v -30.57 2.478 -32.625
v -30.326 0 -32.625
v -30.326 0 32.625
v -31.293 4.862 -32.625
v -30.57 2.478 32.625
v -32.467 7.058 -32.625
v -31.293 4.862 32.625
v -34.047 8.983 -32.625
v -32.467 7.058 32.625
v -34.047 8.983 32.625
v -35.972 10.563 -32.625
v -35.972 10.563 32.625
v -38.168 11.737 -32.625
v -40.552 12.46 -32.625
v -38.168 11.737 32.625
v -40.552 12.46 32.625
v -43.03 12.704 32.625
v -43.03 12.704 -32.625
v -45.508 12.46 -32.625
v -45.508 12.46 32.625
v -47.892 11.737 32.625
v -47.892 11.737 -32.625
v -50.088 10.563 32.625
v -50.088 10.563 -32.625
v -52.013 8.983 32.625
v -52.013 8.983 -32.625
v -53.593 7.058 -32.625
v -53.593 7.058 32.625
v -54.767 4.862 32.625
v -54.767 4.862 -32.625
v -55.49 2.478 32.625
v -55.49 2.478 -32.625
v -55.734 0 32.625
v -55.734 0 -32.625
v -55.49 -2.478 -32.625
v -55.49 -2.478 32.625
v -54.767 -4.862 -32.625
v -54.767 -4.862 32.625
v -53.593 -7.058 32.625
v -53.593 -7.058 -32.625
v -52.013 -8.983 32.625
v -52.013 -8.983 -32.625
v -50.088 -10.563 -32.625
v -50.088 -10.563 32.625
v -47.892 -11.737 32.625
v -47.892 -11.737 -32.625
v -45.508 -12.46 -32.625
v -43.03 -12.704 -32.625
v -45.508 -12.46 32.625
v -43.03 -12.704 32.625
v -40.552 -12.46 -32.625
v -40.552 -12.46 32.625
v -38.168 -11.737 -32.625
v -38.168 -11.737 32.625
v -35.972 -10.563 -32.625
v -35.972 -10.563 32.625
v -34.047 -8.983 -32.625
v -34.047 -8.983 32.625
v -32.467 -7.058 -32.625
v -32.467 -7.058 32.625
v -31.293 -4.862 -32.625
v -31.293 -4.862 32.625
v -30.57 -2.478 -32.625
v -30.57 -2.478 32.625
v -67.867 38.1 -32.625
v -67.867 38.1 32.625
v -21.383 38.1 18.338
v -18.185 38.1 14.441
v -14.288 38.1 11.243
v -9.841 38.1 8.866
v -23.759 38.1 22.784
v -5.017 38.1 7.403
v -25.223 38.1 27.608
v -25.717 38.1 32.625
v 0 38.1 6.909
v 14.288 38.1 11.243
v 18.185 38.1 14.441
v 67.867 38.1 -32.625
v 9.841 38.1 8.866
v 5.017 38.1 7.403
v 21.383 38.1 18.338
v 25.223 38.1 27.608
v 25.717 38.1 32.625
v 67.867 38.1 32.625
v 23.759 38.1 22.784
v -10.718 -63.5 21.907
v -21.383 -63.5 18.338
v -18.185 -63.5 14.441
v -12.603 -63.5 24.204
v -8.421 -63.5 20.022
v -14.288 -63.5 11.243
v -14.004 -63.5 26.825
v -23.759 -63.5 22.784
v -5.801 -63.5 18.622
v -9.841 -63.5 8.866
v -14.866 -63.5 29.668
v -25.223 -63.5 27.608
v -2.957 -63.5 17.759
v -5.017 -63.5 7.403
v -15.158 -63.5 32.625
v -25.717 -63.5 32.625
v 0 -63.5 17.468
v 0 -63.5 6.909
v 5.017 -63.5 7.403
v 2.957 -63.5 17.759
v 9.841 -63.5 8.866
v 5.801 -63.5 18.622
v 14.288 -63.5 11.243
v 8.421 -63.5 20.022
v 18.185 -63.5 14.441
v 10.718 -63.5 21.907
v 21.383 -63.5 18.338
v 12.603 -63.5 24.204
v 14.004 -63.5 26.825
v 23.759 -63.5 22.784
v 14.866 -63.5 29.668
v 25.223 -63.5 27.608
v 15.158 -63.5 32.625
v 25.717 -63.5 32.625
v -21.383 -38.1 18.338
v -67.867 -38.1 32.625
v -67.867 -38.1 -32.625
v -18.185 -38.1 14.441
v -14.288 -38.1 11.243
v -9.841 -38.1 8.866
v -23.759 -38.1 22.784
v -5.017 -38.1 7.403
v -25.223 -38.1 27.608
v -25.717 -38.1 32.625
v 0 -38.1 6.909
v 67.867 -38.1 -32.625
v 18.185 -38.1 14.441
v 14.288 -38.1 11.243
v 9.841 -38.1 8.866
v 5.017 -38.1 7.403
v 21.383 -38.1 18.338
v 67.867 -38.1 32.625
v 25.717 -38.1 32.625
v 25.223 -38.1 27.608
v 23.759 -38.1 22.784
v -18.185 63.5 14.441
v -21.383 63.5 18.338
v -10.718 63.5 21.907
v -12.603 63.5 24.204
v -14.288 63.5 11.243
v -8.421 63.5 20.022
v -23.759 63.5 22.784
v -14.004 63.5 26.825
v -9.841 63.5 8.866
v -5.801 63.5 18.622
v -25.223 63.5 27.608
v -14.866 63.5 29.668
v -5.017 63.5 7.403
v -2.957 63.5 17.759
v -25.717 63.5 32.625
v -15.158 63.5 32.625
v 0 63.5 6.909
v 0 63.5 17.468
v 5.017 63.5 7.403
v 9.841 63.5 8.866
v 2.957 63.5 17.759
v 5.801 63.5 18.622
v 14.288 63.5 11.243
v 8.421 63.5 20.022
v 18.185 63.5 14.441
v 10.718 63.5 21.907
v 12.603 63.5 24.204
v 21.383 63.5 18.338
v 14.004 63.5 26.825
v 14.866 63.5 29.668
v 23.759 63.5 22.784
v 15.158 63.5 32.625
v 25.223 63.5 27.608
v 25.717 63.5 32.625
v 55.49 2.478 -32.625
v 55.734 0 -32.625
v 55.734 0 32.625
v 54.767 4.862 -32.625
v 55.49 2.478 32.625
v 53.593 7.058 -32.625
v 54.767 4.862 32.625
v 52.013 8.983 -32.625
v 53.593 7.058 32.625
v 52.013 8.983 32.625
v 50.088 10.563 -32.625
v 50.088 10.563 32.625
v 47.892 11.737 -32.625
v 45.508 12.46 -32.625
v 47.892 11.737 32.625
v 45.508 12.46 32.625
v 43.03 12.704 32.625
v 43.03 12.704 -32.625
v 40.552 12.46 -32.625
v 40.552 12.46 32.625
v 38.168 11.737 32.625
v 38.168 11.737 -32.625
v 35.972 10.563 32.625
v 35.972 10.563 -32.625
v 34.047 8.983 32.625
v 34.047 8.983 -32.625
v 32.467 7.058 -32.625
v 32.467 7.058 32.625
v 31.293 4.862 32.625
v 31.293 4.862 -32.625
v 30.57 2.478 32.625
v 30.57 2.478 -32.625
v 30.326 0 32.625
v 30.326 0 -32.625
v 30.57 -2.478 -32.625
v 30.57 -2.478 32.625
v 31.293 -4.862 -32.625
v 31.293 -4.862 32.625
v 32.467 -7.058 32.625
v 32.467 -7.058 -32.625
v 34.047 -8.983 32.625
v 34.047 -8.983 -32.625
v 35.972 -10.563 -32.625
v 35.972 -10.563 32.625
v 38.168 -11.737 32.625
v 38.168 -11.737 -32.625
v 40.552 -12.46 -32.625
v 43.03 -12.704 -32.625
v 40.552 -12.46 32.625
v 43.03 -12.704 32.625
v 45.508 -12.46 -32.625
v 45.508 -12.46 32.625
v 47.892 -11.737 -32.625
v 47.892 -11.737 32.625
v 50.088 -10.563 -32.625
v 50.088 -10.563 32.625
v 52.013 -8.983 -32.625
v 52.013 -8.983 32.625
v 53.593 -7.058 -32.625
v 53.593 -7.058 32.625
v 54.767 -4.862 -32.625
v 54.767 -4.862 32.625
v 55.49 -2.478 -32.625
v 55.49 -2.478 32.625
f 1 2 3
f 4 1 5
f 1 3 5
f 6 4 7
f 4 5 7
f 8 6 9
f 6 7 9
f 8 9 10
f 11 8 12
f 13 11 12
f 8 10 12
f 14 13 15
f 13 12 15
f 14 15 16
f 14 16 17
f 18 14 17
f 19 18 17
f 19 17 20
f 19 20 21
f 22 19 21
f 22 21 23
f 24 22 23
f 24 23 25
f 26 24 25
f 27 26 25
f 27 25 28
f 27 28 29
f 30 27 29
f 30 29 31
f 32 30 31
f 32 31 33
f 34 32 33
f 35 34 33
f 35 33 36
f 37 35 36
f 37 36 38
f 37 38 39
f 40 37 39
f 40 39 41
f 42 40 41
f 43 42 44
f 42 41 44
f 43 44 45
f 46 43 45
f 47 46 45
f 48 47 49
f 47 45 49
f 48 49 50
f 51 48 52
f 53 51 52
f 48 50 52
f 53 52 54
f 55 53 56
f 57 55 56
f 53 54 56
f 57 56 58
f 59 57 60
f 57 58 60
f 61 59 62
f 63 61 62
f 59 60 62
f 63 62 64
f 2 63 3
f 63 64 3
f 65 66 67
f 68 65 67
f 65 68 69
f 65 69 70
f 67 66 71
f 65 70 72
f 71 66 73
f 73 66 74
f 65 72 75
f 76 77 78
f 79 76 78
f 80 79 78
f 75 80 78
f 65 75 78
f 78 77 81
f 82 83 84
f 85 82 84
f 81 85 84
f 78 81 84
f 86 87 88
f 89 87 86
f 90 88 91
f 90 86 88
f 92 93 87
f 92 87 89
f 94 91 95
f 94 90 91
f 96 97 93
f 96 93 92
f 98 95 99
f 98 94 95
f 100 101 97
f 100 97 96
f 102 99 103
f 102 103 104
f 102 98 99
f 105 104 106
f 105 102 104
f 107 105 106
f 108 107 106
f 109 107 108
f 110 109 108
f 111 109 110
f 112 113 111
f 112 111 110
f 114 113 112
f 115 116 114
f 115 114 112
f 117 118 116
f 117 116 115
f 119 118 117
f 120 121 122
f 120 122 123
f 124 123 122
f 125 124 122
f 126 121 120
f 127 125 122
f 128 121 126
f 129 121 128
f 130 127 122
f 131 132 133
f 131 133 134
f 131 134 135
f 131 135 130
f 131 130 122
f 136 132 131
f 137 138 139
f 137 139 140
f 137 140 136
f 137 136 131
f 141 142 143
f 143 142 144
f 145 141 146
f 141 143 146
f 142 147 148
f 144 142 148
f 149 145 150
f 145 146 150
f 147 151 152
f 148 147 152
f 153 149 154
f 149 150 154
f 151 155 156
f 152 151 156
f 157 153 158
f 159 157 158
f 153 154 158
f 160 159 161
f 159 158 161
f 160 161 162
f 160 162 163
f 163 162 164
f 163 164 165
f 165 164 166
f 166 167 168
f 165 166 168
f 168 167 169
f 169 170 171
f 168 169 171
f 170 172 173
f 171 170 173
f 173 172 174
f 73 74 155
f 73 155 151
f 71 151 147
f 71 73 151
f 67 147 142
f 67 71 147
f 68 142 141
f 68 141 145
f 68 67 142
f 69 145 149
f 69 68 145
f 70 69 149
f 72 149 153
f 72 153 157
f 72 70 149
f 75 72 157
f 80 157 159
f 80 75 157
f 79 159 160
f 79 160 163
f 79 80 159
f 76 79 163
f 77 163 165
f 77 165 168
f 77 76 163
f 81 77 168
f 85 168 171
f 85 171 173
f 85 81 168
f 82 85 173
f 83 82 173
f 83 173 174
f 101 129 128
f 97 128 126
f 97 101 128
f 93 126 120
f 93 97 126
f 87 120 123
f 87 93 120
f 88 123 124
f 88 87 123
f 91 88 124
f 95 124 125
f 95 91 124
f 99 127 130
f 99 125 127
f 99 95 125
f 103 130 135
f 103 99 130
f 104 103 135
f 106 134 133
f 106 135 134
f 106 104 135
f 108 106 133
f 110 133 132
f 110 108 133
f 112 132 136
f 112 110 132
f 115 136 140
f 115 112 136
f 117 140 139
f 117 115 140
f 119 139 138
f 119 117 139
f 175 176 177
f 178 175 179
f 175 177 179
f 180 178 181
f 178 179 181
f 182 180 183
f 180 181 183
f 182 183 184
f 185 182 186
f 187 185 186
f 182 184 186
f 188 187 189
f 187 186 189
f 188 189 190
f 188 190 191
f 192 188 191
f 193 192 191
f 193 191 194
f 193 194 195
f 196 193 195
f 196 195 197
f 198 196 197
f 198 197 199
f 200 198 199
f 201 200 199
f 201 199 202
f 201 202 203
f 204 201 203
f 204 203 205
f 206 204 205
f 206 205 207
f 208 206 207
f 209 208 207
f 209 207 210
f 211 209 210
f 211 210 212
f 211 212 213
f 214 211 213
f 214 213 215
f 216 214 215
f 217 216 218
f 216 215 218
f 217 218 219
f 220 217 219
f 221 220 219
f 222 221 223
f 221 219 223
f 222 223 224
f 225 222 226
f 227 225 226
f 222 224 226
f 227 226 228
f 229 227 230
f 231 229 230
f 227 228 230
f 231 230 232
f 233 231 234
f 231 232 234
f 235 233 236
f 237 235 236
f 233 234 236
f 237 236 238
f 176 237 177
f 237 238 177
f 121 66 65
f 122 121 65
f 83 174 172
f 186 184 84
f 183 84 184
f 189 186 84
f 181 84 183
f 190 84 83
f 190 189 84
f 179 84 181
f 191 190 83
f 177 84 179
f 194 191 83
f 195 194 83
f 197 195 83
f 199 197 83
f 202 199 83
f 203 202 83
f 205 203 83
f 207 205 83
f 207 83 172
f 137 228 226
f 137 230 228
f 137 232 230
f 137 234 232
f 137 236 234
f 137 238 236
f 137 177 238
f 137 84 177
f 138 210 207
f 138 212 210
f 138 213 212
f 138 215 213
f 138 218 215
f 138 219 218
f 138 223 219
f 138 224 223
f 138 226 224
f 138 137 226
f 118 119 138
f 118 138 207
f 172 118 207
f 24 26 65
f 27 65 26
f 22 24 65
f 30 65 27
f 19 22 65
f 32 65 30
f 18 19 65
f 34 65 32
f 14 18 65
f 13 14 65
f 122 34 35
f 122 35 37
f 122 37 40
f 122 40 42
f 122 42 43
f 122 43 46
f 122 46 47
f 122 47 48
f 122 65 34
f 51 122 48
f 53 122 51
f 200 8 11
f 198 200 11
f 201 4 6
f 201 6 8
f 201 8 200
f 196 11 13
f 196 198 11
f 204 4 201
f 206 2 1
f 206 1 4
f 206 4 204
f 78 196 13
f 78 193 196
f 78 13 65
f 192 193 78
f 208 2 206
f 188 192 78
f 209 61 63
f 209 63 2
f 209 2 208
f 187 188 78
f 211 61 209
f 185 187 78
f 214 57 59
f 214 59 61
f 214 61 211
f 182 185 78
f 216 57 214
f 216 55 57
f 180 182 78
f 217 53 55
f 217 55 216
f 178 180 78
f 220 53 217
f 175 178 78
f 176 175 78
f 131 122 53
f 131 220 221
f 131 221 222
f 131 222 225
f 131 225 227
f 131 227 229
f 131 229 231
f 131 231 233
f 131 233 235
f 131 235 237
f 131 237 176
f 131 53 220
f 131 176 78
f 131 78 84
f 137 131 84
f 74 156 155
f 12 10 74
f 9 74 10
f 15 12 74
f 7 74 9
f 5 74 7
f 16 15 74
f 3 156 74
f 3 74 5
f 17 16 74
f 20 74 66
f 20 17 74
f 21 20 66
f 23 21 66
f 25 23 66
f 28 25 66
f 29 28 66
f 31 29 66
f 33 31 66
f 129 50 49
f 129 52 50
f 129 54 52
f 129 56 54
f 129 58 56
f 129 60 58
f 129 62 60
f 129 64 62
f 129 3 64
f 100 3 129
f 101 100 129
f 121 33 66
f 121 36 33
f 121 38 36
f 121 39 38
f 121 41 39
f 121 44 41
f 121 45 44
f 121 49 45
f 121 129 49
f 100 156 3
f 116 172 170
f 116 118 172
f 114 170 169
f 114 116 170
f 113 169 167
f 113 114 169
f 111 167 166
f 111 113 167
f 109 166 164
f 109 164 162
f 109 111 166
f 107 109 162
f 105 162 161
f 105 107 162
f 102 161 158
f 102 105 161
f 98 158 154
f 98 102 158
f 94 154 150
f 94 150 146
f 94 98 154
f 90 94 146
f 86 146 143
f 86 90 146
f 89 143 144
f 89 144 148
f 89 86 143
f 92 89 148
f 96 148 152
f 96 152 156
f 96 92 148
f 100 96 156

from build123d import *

# Parameters (mm, degrees)
F1_DEPTH = 38.1
F2_DEPTH = 63.5
F3_R     = 12.703802
F4_DEPTH = 65.251941


with BuildPart() as f1:
    # F0 (on Front) → F1 (new body, symmetric)
    with BuildSketch(Plane.XZ):
        with BuildLine():
            Line((-25.716836, 32.62547), (-67.867137, 32.62547))
            Line((-67.867137, 32.62547), (-67.867137, -32.62547))
            Line((-67.867137, -32.62547), (67.867137, -32.62547))
            Line((67.867137, -32.62547), (67.867137, 32.62547))
            Line((67.867137, 32.62547), (25.716836, 32.62547))
            ThreePointArc((25.716836, 32.62547), (0, 6.908634), (-25.716836, 32.62547))
        make_face()
    extrude(amount=F1_DEPTH, both=True)

    # F0 (on Front) → F2 (join, symmetric)
    with BuildSketch(Plane.XZ):
        with BuildLine():
            Line((-15.157554, 32.62547), (-25.716836, 32.62547))
            ThreePointArc((-25.716836, 32.62547), (0, 6.908634), (25.716836, 32.62547))
            Line((25.716836, 32.62547), (15.157554, 32.62547))
            ThreePointArc((15.157554, 32.62547), (0, 17.467917), (-15.157554, 32.62547))
        make_face()
    extrude(amount=F2_DEPTH, both=True)

    # F3 (on face) → F4 (cut, through all)
    with BuildSketch(Plane.XY.offset(32.62547)):
        with Locations((-43.029986, 0)):
            Circle(F3_R)
        with Locations((43.029986, 0)):
            Circle(F3_R)
    extrude(amount=-F4_DEPTH, mode=Mode.SUBTRACT)


solid = f1.part
